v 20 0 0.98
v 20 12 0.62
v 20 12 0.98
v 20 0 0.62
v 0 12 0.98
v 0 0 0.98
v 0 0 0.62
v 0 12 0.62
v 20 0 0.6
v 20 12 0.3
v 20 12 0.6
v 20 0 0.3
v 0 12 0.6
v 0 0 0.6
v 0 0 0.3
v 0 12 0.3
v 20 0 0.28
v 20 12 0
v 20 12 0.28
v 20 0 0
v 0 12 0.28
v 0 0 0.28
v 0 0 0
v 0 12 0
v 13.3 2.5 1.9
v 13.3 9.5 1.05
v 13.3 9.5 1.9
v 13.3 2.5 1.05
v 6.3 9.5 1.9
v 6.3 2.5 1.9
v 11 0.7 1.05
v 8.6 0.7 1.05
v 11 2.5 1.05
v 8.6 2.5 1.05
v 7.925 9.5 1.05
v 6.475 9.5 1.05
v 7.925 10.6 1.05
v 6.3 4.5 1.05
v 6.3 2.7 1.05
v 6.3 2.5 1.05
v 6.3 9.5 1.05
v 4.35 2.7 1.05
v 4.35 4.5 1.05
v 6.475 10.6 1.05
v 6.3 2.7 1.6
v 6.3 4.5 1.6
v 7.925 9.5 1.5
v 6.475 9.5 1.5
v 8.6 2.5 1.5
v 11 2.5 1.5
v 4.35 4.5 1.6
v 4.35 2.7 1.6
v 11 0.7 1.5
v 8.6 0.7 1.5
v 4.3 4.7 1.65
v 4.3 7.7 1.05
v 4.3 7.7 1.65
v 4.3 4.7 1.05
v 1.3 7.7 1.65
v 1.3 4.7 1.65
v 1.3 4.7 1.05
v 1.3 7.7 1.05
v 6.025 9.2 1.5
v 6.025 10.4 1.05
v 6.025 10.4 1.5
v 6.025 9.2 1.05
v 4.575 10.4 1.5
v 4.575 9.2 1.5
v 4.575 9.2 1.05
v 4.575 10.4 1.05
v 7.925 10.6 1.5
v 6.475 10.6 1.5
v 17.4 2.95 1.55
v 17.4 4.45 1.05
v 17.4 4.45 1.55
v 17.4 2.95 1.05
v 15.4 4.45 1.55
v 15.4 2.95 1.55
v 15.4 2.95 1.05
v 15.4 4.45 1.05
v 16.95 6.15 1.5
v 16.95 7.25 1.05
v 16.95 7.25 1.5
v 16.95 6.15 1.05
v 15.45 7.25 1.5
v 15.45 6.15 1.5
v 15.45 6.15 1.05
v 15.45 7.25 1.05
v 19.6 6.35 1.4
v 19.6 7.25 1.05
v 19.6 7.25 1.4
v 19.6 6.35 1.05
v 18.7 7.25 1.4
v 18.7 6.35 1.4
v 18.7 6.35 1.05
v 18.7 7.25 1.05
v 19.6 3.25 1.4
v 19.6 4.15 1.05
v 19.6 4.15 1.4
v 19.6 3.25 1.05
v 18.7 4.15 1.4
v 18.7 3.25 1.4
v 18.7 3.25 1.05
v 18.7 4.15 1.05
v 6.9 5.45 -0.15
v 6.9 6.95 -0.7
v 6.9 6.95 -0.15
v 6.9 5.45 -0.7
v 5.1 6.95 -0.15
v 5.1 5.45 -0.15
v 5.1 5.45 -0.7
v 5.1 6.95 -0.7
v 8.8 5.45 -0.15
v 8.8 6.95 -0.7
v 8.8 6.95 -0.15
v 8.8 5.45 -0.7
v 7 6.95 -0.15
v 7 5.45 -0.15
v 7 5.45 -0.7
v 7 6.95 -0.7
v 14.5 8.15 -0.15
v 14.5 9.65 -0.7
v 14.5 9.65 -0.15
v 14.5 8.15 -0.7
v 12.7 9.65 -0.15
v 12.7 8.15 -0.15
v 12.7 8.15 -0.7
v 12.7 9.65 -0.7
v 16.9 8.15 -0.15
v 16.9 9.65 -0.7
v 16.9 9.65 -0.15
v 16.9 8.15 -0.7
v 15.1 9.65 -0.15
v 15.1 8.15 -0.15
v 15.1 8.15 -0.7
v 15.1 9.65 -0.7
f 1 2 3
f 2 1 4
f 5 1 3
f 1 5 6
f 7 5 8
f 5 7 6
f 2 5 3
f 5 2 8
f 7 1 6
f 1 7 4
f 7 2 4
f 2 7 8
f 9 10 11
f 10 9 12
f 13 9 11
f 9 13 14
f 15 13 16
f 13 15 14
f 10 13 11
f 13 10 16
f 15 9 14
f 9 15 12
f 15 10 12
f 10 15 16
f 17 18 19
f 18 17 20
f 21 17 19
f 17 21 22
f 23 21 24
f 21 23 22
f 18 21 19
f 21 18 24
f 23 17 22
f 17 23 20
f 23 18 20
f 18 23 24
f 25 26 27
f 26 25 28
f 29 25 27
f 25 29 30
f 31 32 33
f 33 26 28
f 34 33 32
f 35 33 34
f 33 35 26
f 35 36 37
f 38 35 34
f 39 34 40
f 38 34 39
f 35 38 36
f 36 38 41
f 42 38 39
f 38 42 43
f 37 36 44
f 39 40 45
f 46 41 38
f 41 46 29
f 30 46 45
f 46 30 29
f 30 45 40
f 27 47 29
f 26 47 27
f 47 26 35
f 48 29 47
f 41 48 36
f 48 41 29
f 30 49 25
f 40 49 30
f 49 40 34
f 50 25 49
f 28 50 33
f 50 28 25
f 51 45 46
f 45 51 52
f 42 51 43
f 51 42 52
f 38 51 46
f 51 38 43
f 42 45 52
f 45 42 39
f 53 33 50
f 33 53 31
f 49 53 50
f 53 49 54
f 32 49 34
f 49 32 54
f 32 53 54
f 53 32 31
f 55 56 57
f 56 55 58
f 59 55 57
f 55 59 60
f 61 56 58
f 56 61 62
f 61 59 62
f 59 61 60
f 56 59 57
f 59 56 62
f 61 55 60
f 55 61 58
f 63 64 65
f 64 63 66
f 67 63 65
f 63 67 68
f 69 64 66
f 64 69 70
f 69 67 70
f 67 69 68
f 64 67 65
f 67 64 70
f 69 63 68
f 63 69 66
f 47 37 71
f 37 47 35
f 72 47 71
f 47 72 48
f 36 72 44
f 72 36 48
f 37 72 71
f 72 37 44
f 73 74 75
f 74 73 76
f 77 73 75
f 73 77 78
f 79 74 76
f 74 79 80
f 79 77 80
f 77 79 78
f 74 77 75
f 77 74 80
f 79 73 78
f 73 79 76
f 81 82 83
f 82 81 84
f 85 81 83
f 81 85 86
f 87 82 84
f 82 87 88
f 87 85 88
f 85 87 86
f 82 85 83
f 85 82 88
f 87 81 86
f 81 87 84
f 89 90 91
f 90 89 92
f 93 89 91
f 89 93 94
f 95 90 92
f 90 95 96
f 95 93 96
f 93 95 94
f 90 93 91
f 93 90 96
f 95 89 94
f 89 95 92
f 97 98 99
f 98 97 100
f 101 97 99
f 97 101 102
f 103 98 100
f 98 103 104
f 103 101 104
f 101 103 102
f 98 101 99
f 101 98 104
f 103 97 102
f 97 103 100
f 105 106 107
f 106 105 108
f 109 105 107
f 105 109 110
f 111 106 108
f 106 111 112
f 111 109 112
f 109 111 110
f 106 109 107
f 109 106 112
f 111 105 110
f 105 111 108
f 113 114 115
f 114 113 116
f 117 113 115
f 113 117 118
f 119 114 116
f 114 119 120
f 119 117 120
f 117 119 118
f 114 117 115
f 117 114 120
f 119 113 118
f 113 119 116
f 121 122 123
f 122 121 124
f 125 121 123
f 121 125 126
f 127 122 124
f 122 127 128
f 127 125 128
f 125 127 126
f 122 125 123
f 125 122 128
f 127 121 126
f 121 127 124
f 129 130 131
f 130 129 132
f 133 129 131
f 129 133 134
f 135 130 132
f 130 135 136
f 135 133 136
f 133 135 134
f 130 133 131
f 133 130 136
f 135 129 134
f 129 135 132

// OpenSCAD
// BeeBoard v0.1 Micro layered 3D explanation model
// Units: mm

board_x = 20;
board_y = 12;

module slab(name, z, h, color_value) {
  color(color_value, 0.72)
    translate([0, 0, z])
      cube([board_x, board_y, h], center=false);
}

module block(name, x, y, z, sx, sy, sz, c) {
  color(c)
    translate([x - sx/2, y - sy/2, z])
      cube([sx, sy, sz], center=false);
}

// Stackup, exaggerated in Z for readability.
slab("F.Cu signal/components", 0.90, 0.08, [1.0, 0.55, 0.10]);
slab("FR4 top dielectric",     0.62, 0.28, [0.10, 0.55, 0.20]);
slab("In1.GND solid plane",    0.54, 0.06, [0.55, 0.55, 0.55]);
slab("FR4 prepreg",            0.30, 0.24, [0.10, 0.55, 0.20]);
slab("In2.PWR islands",        0.22, 0.06, [0.95, 0.18, 0.18]);
slab("FR4 bottom dielectric",  0.06, 0.16, [0.10, 0.55, 0.20]);
slab("B.Cu actuator/debug",    0.00, 0.06, [1.0, 0.55, 0.10]);

// Top components
block("U1 FPGA",        9.8, 6.0, 1.05, 7.0, 7.0, 0.85, [0.12, 0.32, 0.80]);
block("U2 Flash",       5.4, 3.6, 1.05, 2.1, 1.8, 0.55, [0.95, 0.45, 0.12]);
block("U3 IMU",         9.8, 1.6, 1.05, 2.4, 1.8, 0.45, [0.10, 0.65, 0.35]);
block("U4 Harvester",   2.8, 6.2, 1.05, 3.0, 3.0, 0.60, [0.85, 0.18, 0.18]);
block("U5 1V2",         5.3, 9.8, 1.05, 1.45, 1.2, 0.45, [0.85, 0.18, 0.18]);
block("U6 3V3",         7.2,10.0, 1.05, 1.45, 1.2, 0.45, [0.85, 0.18, 0.18]);
block("U7 LiFi RX",    16.4, 3.7, 1.05, 2.0, 1.5, 0.50, [0.10, 0.65, 0.35]);
block("U8 LiFi TX drv",16.2, 6.7, 1.05, 1.5, 1.1, 0.45, [0.90, 0.12, 0.35]);
block("D1 LED",        19.15,6.8, 1.05, 0.9, 0.9, 0.35, [1.0, 0.05, 0.05]);
block("D2 photodiode", 19.15,3.7, 1.05, 0.9, 0.9, 0.35, [0.05, 0.8, 0.25]);

// Bottom-side driver positions, shown below the board.
block("U9 wing A",      6.0, 6.2, -0.70, 1.8, 1.5, 0.55, [0.38, 0.42, 0.48]);
block("U10 wing B",     7.9, 6.2, -0.70, 1.8, 1.5, 0.55, [0.38, 0.42, 0.48]);
block("U11 spring",    13.6, 8.9, -0.70, 1.8, 1.5, 0.55, [0.38, 0.42, 0.48]);
block("U12 drill",     16.0, 8.9, -0.70, 1.8, 1.5, 0.55, [0.38, 0.42, 0.48]);
